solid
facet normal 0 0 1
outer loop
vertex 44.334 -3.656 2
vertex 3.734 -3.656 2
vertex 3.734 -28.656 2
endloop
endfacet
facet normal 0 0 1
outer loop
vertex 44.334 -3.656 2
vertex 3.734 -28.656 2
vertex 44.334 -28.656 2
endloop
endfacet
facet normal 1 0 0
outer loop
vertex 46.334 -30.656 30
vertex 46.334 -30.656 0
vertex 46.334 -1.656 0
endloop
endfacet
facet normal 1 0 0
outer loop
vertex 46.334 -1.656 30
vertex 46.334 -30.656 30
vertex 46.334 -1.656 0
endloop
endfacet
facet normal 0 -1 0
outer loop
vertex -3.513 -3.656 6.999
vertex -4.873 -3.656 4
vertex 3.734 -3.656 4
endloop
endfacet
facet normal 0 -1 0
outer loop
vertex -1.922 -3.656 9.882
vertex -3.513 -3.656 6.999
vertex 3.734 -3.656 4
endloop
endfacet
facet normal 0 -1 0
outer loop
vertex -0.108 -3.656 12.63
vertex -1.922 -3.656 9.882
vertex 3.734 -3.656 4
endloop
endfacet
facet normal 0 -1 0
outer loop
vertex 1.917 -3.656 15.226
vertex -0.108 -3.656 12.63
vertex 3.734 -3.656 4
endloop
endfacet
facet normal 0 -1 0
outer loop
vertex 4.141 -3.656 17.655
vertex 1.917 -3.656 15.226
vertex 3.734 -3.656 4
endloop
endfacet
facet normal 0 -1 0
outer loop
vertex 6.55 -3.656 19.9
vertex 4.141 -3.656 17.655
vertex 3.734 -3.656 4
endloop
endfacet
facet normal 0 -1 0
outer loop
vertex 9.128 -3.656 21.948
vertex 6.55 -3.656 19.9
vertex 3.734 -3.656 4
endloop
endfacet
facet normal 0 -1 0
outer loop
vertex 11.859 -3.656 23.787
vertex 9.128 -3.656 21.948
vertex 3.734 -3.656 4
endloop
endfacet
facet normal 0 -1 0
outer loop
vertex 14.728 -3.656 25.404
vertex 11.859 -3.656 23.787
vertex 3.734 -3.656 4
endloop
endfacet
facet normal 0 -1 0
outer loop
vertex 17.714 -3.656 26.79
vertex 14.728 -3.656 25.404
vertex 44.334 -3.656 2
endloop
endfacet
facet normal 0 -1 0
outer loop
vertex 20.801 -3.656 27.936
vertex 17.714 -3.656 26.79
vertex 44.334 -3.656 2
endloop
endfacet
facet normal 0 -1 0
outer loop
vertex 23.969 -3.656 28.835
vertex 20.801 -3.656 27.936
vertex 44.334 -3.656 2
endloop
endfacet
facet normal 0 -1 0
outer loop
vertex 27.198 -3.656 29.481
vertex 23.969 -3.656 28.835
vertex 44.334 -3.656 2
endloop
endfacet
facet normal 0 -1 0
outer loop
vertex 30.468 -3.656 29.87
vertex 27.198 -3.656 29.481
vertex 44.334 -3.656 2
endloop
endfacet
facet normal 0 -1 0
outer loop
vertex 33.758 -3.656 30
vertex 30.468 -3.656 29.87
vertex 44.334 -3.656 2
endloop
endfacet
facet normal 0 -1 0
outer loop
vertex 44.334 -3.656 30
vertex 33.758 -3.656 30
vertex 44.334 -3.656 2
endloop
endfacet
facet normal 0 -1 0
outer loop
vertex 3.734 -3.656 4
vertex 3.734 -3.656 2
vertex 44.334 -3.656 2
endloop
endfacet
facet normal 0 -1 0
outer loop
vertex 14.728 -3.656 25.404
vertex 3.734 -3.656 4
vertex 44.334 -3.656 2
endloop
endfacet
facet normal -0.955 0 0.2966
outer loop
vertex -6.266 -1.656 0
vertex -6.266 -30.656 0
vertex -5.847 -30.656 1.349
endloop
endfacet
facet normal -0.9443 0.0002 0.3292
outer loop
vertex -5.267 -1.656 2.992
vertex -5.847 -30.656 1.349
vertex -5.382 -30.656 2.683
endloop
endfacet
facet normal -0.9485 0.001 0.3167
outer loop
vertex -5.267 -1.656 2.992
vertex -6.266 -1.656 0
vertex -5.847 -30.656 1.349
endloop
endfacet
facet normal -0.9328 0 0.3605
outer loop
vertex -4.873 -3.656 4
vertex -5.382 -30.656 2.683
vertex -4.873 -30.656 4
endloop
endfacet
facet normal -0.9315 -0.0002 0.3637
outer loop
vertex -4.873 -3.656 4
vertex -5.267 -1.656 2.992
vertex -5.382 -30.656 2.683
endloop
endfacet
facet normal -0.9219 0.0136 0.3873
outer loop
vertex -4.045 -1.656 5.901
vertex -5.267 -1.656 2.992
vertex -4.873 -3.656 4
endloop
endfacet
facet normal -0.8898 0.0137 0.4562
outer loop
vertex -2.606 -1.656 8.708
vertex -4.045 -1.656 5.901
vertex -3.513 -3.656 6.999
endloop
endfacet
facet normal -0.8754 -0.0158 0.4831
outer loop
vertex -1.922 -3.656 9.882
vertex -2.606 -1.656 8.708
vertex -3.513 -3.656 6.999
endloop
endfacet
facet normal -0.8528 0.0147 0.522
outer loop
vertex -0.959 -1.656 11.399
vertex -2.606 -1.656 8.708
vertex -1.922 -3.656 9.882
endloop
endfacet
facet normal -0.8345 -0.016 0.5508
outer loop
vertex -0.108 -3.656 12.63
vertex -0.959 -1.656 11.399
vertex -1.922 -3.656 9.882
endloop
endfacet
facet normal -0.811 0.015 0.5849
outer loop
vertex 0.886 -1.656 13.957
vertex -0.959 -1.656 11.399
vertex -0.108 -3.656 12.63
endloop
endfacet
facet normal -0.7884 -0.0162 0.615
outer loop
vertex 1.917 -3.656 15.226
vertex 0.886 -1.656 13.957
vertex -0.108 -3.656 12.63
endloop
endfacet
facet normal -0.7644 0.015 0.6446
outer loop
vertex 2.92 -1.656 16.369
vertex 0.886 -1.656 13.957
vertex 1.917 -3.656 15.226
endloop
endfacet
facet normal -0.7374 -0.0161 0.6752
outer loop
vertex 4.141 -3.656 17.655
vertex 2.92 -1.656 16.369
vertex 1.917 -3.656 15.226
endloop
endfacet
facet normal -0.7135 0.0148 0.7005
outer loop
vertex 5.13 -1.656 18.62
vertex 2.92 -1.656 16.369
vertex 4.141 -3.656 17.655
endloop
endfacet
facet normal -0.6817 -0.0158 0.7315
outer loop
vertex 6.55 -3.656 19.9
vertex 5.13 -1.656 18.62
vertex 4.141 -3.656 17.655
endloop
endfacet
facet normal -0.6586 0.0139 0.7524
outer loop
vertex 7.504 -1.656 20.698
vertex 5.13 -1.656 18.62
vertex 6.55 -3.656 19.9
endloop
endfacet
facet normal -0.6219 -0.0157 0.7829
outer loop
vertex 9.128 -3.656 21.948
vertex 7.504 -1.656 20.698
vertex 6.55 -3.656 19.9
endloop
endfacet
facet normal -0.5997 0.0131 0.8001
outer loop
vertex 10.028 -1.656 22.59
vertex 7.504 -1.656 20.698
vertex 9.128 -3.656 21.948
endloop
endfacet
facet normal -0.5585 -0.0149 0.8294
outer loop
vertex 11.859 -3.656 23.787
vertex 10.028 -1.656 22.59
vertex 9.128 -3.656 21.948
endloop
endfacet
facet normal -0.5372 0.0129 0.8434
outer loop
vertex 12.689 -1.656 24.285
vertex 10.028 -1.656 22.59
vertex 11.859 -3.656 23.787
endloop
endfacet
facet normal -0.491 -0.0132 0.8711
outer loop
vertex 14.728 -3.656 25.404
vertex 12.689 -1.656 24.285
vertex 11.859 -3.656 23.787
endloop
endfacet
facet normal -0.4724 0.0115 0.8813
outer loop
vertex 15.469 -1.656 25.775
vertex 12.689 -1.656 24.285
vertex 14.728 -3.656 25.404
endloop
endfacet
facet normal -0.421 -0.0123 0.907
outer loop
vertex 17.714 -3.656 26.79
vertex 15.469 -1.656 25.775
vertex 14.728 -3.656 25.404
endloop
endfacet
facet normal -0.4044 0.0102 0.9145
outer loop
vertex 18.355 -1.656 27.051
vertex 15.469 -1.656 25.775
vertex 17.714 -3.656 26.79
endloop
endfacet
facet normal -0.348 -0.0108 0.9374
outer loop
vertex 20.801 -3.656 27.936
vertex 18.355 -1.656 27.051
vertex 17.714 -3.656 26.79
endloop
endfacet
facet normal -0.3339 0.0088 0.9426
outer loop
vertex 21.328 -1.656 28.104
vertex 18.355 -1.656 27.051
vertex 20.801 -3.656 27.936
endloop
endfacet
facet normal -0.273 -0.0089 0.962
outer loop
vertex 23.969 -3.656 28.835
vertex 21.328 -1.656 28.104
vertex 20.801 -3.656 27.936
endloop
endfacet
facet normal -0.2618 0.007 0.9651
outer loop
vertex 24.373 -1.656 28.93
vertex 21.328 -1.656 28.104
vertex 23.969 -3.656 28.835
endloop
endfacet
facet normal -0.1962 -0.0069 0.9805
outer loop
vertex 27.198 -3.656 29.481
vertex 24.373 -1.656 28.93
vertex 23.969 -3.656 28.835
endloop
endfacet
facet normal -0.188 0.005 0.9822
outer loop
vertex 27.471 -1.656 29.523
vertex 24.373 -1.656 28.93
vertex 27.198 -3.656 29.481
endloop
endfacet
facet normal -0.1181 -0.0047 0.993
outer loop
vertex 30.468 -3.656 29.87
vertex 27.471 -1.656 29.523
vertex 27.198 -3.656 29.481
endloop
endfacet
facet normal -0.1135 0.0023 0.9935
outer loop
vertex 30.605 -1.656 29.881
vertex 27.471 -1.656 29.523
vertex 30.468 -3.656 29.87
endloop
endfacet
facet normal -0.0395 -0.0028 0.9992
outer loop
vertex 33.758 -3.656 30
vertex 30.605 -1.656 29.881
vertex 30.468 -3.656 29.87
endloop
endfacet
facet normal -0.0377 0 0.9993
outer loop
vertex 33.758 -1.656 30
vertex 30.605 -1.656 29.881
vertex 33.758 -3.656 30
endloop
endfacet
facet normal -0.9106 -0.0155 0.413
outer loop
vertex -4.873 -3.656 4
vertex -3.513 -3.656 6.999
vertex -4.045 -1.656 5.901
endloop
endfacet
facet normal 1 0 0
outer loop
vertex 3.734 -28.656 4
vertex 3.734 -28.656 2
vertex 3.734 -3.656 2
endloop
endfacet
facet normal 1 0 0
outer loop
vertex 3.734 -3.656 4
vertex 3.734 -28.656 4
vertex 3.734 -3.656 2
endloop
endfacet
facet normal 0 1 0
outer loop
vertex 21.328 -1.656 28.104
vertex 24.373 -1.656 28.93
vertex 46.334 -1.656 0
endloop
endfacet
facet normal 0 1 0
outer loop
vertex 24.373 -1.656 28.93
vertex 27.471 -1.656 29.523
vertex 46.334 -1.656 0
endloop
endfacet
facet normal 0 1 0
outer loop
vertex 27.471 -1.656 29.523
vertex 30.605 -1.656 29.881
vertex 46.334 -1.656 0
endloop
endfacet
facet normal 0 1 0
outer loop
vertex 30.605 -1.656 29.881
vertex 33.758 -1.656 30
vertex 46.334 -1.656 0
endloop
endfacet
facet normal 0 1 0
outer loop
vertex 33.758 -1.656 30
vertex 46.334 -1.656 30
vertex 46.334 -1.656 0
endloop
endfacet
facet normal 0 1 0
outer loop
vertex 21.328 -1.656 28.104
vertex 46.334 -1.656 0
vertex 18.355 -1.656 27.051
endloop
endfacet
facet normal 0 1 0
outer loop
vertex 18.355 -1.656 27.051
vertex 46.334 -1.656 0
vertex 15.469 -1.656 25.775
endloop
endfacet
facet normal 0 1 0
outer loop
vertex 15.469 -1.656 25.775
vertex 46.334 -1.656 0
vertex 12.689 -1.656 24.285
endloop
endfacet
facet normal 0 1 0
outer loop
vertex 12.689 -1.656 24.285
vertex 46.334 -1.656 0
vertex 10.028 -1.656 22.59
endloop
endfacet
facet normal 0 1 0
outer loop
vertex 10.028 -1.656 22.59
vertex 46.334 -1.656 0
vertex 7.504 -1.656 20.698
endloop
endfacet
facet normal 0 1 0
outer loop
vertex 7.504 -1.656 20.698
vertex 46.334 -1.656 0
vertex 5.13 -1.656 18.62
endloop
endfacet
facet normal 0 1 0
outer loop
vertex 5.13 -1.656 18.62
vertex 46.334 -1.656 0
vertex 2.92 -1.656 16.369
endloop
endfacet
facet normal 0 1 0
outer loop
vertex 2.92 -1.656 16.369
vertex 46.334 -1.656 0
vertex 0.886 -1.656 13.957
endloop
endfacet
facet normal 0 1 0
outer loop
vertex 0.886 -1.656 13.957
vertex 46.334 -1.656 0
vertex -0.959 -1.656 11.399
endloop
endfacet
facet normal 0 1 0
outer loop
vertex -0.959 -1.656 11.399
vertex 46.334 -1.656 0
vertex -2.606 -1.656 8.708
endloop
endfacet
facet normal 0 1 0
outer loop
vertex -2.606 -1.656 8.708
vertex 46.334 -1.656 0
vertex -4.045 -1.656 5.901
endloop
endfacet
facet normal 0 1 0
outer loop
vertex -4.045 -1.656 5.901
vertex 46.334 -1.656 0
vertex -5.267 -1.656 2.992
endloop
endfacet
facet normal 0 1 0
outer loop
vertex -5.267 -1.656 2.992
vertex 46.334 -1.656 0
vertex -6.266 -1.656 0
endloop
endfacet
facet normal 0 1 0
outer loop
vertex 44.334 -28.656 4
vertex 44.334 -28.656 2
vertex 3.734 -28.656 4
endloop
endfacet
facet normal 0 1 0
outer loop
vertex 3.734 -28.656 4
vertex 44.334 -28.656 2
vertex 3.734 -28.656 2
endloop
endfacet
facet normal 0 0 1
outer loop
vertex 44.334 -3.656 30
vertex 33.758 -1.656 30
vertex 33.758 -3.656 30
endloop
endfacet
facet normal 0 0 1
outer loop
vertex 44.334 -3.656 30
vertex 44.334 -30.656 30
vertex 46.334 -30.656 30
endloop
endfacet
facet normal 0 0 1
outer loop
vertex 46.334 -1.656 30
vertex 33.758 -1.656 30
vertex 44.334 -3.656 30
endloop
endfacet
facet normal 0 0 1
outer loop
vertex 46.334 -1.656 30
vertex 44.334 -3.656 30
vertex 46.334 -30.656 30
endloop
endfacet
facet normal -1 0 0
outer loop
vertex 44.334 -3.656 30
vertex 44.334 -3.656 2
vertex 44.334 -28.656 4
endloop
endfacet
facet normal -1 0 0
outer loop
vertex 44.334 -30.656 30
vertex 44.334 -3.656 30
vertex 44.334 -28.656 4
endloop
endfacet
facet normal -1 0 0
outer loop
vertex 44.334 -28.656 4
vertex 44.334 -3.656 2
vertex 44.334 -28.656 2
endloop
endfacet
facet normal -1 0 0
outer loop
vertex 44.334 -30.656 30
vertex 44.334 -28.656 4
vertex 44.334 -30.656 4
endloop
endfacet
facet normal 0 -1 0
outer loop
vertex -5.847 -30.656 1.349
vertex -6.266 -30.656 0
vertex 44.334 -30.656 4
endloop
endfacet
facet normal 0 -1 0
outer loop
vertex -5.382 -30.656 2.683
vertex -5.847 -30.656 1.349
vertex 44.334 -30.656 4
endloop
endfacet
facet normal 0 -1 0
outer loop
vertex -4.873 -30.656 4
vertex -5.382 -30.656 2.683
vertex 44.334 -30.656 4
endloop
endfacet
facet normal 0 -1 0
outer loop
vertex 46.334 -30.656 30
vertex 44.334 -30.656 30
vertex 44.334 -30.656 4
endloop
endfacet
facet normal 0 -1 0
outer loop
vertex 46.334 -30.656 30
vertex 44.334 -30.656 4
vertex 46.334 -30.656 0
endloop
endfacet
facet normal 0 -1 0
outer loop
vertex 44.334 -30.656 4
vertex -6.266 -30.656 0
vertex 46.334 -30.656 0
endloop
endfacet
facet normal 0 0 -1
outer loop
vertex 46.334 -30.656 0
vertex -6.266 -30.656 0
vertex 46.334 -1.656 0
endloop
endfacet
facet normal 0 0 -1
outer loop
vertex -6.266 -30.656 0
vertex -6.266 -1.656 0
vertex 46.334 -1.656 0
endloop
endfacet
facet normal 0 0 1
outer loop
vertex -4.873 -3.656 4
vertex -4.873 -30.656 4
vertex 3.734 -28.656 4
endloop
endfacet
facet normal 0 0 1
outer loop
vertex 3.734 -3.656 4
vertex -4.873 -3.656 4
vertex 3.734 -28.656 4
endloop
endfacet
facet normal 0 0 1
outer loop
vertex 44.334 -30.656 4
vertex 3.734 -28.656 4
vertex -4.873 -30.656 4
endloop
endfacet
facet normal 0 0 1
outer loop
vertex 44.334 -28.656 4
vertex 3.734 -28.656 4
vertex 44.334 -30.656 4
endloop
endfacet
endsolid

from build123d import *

# Parameters (mm, degrees)
F0_W        = 40.6
F0_H        = 25
F1_DEPTH    = 2
F2_DEPTH    = 30
F3_DEPTH    = 4
F4_DEPTH    = 30
F0_W_2      = 10
F5_DEPTH    = 4
F6_T1_DEPTH = 202.1185772835


# Not quite as in the source:
# - a fillet or chamfer that OpenCascade refuses, or shapes differently, is made with other operations: its cross-section is extruded or revolved along the edge and cut away or added


with BuildPart() as f1:
    # F0 (on Top) → F1 (new body)
    with BuildSketch(Plane.XY):
        with Locations((24.0341860496, -16.1564178318)):
            Rectangle(F0_W, F0_H)
    extrude(amount=F1_DEPTH)

    # F0 (on Top) → F2 (join)
    with BuildSketch(Plane.XY):
        Polygon((44.3341860496, -1.6564178318), (44.3341860496, -3.6564178318), (44.3341860496, -28.6564178318), (44.3341860496, -30.6564178318), (46.3341860496, -30.6564178318), (46.3341860496, -1.6564178318), align=None)
    extrude(amount=F2_DEPTH)

    # F0 (on Top) → F3 (join)
    with BuildSketch(Plane.XY):
        Polygon((44.3341860496, -28.6564178318), (3.7341860496, -28.6564178318), (-6.2658139504, -28.6564178318), (-6.2658139504, -30.6564178318), (44.3341860496, -30.6564178318), align=None)
    extrude(amount=F3_DEPTH)

    # F0 (on Top) → F4 (join)
    with BuildSketch(Plane.XY):
        Polygon((-6.2658139504, -3.6564178318), (3.7341860496, -3.6564178318), (44.3341860496, -3.6564178318), (44.3341860496, -1.6564178318), (-6.2658139504, -1.6564178318), align=None)
    extrude(amount=F4_DEPTH)

    # F0 (on Top) → F5 (join)
    with BuildSketch(Plane.XY):
        with Locations((-1.2658139504, -16.1564178318)):
            Rectangle(F0_W_2, F0_H)
    extrude(amount=F5_DEPTH)

    # F6: fillet of radius 41.6982966493 on 1 edges, made by hand

    # F6_s2 → F6_t1 (cut)
    with BuildSketch(Plane.XZ.offset(-98.40287081)):
        with BuildLine():
            ThreePointArc((-6.2658139504, 0), (8.7484143116, 21.6674566572), (33.7579015062, 30))
            Line((33.7579015062, 30), (-6.2658139504, 30))
            Line((-6.2658139504, 30), (-6.2658139504, 0))
        make_face()
    extrude(amount=F6_T1_DEPTH, mode=Mode.SUBTRACT)


solid = f1.part
